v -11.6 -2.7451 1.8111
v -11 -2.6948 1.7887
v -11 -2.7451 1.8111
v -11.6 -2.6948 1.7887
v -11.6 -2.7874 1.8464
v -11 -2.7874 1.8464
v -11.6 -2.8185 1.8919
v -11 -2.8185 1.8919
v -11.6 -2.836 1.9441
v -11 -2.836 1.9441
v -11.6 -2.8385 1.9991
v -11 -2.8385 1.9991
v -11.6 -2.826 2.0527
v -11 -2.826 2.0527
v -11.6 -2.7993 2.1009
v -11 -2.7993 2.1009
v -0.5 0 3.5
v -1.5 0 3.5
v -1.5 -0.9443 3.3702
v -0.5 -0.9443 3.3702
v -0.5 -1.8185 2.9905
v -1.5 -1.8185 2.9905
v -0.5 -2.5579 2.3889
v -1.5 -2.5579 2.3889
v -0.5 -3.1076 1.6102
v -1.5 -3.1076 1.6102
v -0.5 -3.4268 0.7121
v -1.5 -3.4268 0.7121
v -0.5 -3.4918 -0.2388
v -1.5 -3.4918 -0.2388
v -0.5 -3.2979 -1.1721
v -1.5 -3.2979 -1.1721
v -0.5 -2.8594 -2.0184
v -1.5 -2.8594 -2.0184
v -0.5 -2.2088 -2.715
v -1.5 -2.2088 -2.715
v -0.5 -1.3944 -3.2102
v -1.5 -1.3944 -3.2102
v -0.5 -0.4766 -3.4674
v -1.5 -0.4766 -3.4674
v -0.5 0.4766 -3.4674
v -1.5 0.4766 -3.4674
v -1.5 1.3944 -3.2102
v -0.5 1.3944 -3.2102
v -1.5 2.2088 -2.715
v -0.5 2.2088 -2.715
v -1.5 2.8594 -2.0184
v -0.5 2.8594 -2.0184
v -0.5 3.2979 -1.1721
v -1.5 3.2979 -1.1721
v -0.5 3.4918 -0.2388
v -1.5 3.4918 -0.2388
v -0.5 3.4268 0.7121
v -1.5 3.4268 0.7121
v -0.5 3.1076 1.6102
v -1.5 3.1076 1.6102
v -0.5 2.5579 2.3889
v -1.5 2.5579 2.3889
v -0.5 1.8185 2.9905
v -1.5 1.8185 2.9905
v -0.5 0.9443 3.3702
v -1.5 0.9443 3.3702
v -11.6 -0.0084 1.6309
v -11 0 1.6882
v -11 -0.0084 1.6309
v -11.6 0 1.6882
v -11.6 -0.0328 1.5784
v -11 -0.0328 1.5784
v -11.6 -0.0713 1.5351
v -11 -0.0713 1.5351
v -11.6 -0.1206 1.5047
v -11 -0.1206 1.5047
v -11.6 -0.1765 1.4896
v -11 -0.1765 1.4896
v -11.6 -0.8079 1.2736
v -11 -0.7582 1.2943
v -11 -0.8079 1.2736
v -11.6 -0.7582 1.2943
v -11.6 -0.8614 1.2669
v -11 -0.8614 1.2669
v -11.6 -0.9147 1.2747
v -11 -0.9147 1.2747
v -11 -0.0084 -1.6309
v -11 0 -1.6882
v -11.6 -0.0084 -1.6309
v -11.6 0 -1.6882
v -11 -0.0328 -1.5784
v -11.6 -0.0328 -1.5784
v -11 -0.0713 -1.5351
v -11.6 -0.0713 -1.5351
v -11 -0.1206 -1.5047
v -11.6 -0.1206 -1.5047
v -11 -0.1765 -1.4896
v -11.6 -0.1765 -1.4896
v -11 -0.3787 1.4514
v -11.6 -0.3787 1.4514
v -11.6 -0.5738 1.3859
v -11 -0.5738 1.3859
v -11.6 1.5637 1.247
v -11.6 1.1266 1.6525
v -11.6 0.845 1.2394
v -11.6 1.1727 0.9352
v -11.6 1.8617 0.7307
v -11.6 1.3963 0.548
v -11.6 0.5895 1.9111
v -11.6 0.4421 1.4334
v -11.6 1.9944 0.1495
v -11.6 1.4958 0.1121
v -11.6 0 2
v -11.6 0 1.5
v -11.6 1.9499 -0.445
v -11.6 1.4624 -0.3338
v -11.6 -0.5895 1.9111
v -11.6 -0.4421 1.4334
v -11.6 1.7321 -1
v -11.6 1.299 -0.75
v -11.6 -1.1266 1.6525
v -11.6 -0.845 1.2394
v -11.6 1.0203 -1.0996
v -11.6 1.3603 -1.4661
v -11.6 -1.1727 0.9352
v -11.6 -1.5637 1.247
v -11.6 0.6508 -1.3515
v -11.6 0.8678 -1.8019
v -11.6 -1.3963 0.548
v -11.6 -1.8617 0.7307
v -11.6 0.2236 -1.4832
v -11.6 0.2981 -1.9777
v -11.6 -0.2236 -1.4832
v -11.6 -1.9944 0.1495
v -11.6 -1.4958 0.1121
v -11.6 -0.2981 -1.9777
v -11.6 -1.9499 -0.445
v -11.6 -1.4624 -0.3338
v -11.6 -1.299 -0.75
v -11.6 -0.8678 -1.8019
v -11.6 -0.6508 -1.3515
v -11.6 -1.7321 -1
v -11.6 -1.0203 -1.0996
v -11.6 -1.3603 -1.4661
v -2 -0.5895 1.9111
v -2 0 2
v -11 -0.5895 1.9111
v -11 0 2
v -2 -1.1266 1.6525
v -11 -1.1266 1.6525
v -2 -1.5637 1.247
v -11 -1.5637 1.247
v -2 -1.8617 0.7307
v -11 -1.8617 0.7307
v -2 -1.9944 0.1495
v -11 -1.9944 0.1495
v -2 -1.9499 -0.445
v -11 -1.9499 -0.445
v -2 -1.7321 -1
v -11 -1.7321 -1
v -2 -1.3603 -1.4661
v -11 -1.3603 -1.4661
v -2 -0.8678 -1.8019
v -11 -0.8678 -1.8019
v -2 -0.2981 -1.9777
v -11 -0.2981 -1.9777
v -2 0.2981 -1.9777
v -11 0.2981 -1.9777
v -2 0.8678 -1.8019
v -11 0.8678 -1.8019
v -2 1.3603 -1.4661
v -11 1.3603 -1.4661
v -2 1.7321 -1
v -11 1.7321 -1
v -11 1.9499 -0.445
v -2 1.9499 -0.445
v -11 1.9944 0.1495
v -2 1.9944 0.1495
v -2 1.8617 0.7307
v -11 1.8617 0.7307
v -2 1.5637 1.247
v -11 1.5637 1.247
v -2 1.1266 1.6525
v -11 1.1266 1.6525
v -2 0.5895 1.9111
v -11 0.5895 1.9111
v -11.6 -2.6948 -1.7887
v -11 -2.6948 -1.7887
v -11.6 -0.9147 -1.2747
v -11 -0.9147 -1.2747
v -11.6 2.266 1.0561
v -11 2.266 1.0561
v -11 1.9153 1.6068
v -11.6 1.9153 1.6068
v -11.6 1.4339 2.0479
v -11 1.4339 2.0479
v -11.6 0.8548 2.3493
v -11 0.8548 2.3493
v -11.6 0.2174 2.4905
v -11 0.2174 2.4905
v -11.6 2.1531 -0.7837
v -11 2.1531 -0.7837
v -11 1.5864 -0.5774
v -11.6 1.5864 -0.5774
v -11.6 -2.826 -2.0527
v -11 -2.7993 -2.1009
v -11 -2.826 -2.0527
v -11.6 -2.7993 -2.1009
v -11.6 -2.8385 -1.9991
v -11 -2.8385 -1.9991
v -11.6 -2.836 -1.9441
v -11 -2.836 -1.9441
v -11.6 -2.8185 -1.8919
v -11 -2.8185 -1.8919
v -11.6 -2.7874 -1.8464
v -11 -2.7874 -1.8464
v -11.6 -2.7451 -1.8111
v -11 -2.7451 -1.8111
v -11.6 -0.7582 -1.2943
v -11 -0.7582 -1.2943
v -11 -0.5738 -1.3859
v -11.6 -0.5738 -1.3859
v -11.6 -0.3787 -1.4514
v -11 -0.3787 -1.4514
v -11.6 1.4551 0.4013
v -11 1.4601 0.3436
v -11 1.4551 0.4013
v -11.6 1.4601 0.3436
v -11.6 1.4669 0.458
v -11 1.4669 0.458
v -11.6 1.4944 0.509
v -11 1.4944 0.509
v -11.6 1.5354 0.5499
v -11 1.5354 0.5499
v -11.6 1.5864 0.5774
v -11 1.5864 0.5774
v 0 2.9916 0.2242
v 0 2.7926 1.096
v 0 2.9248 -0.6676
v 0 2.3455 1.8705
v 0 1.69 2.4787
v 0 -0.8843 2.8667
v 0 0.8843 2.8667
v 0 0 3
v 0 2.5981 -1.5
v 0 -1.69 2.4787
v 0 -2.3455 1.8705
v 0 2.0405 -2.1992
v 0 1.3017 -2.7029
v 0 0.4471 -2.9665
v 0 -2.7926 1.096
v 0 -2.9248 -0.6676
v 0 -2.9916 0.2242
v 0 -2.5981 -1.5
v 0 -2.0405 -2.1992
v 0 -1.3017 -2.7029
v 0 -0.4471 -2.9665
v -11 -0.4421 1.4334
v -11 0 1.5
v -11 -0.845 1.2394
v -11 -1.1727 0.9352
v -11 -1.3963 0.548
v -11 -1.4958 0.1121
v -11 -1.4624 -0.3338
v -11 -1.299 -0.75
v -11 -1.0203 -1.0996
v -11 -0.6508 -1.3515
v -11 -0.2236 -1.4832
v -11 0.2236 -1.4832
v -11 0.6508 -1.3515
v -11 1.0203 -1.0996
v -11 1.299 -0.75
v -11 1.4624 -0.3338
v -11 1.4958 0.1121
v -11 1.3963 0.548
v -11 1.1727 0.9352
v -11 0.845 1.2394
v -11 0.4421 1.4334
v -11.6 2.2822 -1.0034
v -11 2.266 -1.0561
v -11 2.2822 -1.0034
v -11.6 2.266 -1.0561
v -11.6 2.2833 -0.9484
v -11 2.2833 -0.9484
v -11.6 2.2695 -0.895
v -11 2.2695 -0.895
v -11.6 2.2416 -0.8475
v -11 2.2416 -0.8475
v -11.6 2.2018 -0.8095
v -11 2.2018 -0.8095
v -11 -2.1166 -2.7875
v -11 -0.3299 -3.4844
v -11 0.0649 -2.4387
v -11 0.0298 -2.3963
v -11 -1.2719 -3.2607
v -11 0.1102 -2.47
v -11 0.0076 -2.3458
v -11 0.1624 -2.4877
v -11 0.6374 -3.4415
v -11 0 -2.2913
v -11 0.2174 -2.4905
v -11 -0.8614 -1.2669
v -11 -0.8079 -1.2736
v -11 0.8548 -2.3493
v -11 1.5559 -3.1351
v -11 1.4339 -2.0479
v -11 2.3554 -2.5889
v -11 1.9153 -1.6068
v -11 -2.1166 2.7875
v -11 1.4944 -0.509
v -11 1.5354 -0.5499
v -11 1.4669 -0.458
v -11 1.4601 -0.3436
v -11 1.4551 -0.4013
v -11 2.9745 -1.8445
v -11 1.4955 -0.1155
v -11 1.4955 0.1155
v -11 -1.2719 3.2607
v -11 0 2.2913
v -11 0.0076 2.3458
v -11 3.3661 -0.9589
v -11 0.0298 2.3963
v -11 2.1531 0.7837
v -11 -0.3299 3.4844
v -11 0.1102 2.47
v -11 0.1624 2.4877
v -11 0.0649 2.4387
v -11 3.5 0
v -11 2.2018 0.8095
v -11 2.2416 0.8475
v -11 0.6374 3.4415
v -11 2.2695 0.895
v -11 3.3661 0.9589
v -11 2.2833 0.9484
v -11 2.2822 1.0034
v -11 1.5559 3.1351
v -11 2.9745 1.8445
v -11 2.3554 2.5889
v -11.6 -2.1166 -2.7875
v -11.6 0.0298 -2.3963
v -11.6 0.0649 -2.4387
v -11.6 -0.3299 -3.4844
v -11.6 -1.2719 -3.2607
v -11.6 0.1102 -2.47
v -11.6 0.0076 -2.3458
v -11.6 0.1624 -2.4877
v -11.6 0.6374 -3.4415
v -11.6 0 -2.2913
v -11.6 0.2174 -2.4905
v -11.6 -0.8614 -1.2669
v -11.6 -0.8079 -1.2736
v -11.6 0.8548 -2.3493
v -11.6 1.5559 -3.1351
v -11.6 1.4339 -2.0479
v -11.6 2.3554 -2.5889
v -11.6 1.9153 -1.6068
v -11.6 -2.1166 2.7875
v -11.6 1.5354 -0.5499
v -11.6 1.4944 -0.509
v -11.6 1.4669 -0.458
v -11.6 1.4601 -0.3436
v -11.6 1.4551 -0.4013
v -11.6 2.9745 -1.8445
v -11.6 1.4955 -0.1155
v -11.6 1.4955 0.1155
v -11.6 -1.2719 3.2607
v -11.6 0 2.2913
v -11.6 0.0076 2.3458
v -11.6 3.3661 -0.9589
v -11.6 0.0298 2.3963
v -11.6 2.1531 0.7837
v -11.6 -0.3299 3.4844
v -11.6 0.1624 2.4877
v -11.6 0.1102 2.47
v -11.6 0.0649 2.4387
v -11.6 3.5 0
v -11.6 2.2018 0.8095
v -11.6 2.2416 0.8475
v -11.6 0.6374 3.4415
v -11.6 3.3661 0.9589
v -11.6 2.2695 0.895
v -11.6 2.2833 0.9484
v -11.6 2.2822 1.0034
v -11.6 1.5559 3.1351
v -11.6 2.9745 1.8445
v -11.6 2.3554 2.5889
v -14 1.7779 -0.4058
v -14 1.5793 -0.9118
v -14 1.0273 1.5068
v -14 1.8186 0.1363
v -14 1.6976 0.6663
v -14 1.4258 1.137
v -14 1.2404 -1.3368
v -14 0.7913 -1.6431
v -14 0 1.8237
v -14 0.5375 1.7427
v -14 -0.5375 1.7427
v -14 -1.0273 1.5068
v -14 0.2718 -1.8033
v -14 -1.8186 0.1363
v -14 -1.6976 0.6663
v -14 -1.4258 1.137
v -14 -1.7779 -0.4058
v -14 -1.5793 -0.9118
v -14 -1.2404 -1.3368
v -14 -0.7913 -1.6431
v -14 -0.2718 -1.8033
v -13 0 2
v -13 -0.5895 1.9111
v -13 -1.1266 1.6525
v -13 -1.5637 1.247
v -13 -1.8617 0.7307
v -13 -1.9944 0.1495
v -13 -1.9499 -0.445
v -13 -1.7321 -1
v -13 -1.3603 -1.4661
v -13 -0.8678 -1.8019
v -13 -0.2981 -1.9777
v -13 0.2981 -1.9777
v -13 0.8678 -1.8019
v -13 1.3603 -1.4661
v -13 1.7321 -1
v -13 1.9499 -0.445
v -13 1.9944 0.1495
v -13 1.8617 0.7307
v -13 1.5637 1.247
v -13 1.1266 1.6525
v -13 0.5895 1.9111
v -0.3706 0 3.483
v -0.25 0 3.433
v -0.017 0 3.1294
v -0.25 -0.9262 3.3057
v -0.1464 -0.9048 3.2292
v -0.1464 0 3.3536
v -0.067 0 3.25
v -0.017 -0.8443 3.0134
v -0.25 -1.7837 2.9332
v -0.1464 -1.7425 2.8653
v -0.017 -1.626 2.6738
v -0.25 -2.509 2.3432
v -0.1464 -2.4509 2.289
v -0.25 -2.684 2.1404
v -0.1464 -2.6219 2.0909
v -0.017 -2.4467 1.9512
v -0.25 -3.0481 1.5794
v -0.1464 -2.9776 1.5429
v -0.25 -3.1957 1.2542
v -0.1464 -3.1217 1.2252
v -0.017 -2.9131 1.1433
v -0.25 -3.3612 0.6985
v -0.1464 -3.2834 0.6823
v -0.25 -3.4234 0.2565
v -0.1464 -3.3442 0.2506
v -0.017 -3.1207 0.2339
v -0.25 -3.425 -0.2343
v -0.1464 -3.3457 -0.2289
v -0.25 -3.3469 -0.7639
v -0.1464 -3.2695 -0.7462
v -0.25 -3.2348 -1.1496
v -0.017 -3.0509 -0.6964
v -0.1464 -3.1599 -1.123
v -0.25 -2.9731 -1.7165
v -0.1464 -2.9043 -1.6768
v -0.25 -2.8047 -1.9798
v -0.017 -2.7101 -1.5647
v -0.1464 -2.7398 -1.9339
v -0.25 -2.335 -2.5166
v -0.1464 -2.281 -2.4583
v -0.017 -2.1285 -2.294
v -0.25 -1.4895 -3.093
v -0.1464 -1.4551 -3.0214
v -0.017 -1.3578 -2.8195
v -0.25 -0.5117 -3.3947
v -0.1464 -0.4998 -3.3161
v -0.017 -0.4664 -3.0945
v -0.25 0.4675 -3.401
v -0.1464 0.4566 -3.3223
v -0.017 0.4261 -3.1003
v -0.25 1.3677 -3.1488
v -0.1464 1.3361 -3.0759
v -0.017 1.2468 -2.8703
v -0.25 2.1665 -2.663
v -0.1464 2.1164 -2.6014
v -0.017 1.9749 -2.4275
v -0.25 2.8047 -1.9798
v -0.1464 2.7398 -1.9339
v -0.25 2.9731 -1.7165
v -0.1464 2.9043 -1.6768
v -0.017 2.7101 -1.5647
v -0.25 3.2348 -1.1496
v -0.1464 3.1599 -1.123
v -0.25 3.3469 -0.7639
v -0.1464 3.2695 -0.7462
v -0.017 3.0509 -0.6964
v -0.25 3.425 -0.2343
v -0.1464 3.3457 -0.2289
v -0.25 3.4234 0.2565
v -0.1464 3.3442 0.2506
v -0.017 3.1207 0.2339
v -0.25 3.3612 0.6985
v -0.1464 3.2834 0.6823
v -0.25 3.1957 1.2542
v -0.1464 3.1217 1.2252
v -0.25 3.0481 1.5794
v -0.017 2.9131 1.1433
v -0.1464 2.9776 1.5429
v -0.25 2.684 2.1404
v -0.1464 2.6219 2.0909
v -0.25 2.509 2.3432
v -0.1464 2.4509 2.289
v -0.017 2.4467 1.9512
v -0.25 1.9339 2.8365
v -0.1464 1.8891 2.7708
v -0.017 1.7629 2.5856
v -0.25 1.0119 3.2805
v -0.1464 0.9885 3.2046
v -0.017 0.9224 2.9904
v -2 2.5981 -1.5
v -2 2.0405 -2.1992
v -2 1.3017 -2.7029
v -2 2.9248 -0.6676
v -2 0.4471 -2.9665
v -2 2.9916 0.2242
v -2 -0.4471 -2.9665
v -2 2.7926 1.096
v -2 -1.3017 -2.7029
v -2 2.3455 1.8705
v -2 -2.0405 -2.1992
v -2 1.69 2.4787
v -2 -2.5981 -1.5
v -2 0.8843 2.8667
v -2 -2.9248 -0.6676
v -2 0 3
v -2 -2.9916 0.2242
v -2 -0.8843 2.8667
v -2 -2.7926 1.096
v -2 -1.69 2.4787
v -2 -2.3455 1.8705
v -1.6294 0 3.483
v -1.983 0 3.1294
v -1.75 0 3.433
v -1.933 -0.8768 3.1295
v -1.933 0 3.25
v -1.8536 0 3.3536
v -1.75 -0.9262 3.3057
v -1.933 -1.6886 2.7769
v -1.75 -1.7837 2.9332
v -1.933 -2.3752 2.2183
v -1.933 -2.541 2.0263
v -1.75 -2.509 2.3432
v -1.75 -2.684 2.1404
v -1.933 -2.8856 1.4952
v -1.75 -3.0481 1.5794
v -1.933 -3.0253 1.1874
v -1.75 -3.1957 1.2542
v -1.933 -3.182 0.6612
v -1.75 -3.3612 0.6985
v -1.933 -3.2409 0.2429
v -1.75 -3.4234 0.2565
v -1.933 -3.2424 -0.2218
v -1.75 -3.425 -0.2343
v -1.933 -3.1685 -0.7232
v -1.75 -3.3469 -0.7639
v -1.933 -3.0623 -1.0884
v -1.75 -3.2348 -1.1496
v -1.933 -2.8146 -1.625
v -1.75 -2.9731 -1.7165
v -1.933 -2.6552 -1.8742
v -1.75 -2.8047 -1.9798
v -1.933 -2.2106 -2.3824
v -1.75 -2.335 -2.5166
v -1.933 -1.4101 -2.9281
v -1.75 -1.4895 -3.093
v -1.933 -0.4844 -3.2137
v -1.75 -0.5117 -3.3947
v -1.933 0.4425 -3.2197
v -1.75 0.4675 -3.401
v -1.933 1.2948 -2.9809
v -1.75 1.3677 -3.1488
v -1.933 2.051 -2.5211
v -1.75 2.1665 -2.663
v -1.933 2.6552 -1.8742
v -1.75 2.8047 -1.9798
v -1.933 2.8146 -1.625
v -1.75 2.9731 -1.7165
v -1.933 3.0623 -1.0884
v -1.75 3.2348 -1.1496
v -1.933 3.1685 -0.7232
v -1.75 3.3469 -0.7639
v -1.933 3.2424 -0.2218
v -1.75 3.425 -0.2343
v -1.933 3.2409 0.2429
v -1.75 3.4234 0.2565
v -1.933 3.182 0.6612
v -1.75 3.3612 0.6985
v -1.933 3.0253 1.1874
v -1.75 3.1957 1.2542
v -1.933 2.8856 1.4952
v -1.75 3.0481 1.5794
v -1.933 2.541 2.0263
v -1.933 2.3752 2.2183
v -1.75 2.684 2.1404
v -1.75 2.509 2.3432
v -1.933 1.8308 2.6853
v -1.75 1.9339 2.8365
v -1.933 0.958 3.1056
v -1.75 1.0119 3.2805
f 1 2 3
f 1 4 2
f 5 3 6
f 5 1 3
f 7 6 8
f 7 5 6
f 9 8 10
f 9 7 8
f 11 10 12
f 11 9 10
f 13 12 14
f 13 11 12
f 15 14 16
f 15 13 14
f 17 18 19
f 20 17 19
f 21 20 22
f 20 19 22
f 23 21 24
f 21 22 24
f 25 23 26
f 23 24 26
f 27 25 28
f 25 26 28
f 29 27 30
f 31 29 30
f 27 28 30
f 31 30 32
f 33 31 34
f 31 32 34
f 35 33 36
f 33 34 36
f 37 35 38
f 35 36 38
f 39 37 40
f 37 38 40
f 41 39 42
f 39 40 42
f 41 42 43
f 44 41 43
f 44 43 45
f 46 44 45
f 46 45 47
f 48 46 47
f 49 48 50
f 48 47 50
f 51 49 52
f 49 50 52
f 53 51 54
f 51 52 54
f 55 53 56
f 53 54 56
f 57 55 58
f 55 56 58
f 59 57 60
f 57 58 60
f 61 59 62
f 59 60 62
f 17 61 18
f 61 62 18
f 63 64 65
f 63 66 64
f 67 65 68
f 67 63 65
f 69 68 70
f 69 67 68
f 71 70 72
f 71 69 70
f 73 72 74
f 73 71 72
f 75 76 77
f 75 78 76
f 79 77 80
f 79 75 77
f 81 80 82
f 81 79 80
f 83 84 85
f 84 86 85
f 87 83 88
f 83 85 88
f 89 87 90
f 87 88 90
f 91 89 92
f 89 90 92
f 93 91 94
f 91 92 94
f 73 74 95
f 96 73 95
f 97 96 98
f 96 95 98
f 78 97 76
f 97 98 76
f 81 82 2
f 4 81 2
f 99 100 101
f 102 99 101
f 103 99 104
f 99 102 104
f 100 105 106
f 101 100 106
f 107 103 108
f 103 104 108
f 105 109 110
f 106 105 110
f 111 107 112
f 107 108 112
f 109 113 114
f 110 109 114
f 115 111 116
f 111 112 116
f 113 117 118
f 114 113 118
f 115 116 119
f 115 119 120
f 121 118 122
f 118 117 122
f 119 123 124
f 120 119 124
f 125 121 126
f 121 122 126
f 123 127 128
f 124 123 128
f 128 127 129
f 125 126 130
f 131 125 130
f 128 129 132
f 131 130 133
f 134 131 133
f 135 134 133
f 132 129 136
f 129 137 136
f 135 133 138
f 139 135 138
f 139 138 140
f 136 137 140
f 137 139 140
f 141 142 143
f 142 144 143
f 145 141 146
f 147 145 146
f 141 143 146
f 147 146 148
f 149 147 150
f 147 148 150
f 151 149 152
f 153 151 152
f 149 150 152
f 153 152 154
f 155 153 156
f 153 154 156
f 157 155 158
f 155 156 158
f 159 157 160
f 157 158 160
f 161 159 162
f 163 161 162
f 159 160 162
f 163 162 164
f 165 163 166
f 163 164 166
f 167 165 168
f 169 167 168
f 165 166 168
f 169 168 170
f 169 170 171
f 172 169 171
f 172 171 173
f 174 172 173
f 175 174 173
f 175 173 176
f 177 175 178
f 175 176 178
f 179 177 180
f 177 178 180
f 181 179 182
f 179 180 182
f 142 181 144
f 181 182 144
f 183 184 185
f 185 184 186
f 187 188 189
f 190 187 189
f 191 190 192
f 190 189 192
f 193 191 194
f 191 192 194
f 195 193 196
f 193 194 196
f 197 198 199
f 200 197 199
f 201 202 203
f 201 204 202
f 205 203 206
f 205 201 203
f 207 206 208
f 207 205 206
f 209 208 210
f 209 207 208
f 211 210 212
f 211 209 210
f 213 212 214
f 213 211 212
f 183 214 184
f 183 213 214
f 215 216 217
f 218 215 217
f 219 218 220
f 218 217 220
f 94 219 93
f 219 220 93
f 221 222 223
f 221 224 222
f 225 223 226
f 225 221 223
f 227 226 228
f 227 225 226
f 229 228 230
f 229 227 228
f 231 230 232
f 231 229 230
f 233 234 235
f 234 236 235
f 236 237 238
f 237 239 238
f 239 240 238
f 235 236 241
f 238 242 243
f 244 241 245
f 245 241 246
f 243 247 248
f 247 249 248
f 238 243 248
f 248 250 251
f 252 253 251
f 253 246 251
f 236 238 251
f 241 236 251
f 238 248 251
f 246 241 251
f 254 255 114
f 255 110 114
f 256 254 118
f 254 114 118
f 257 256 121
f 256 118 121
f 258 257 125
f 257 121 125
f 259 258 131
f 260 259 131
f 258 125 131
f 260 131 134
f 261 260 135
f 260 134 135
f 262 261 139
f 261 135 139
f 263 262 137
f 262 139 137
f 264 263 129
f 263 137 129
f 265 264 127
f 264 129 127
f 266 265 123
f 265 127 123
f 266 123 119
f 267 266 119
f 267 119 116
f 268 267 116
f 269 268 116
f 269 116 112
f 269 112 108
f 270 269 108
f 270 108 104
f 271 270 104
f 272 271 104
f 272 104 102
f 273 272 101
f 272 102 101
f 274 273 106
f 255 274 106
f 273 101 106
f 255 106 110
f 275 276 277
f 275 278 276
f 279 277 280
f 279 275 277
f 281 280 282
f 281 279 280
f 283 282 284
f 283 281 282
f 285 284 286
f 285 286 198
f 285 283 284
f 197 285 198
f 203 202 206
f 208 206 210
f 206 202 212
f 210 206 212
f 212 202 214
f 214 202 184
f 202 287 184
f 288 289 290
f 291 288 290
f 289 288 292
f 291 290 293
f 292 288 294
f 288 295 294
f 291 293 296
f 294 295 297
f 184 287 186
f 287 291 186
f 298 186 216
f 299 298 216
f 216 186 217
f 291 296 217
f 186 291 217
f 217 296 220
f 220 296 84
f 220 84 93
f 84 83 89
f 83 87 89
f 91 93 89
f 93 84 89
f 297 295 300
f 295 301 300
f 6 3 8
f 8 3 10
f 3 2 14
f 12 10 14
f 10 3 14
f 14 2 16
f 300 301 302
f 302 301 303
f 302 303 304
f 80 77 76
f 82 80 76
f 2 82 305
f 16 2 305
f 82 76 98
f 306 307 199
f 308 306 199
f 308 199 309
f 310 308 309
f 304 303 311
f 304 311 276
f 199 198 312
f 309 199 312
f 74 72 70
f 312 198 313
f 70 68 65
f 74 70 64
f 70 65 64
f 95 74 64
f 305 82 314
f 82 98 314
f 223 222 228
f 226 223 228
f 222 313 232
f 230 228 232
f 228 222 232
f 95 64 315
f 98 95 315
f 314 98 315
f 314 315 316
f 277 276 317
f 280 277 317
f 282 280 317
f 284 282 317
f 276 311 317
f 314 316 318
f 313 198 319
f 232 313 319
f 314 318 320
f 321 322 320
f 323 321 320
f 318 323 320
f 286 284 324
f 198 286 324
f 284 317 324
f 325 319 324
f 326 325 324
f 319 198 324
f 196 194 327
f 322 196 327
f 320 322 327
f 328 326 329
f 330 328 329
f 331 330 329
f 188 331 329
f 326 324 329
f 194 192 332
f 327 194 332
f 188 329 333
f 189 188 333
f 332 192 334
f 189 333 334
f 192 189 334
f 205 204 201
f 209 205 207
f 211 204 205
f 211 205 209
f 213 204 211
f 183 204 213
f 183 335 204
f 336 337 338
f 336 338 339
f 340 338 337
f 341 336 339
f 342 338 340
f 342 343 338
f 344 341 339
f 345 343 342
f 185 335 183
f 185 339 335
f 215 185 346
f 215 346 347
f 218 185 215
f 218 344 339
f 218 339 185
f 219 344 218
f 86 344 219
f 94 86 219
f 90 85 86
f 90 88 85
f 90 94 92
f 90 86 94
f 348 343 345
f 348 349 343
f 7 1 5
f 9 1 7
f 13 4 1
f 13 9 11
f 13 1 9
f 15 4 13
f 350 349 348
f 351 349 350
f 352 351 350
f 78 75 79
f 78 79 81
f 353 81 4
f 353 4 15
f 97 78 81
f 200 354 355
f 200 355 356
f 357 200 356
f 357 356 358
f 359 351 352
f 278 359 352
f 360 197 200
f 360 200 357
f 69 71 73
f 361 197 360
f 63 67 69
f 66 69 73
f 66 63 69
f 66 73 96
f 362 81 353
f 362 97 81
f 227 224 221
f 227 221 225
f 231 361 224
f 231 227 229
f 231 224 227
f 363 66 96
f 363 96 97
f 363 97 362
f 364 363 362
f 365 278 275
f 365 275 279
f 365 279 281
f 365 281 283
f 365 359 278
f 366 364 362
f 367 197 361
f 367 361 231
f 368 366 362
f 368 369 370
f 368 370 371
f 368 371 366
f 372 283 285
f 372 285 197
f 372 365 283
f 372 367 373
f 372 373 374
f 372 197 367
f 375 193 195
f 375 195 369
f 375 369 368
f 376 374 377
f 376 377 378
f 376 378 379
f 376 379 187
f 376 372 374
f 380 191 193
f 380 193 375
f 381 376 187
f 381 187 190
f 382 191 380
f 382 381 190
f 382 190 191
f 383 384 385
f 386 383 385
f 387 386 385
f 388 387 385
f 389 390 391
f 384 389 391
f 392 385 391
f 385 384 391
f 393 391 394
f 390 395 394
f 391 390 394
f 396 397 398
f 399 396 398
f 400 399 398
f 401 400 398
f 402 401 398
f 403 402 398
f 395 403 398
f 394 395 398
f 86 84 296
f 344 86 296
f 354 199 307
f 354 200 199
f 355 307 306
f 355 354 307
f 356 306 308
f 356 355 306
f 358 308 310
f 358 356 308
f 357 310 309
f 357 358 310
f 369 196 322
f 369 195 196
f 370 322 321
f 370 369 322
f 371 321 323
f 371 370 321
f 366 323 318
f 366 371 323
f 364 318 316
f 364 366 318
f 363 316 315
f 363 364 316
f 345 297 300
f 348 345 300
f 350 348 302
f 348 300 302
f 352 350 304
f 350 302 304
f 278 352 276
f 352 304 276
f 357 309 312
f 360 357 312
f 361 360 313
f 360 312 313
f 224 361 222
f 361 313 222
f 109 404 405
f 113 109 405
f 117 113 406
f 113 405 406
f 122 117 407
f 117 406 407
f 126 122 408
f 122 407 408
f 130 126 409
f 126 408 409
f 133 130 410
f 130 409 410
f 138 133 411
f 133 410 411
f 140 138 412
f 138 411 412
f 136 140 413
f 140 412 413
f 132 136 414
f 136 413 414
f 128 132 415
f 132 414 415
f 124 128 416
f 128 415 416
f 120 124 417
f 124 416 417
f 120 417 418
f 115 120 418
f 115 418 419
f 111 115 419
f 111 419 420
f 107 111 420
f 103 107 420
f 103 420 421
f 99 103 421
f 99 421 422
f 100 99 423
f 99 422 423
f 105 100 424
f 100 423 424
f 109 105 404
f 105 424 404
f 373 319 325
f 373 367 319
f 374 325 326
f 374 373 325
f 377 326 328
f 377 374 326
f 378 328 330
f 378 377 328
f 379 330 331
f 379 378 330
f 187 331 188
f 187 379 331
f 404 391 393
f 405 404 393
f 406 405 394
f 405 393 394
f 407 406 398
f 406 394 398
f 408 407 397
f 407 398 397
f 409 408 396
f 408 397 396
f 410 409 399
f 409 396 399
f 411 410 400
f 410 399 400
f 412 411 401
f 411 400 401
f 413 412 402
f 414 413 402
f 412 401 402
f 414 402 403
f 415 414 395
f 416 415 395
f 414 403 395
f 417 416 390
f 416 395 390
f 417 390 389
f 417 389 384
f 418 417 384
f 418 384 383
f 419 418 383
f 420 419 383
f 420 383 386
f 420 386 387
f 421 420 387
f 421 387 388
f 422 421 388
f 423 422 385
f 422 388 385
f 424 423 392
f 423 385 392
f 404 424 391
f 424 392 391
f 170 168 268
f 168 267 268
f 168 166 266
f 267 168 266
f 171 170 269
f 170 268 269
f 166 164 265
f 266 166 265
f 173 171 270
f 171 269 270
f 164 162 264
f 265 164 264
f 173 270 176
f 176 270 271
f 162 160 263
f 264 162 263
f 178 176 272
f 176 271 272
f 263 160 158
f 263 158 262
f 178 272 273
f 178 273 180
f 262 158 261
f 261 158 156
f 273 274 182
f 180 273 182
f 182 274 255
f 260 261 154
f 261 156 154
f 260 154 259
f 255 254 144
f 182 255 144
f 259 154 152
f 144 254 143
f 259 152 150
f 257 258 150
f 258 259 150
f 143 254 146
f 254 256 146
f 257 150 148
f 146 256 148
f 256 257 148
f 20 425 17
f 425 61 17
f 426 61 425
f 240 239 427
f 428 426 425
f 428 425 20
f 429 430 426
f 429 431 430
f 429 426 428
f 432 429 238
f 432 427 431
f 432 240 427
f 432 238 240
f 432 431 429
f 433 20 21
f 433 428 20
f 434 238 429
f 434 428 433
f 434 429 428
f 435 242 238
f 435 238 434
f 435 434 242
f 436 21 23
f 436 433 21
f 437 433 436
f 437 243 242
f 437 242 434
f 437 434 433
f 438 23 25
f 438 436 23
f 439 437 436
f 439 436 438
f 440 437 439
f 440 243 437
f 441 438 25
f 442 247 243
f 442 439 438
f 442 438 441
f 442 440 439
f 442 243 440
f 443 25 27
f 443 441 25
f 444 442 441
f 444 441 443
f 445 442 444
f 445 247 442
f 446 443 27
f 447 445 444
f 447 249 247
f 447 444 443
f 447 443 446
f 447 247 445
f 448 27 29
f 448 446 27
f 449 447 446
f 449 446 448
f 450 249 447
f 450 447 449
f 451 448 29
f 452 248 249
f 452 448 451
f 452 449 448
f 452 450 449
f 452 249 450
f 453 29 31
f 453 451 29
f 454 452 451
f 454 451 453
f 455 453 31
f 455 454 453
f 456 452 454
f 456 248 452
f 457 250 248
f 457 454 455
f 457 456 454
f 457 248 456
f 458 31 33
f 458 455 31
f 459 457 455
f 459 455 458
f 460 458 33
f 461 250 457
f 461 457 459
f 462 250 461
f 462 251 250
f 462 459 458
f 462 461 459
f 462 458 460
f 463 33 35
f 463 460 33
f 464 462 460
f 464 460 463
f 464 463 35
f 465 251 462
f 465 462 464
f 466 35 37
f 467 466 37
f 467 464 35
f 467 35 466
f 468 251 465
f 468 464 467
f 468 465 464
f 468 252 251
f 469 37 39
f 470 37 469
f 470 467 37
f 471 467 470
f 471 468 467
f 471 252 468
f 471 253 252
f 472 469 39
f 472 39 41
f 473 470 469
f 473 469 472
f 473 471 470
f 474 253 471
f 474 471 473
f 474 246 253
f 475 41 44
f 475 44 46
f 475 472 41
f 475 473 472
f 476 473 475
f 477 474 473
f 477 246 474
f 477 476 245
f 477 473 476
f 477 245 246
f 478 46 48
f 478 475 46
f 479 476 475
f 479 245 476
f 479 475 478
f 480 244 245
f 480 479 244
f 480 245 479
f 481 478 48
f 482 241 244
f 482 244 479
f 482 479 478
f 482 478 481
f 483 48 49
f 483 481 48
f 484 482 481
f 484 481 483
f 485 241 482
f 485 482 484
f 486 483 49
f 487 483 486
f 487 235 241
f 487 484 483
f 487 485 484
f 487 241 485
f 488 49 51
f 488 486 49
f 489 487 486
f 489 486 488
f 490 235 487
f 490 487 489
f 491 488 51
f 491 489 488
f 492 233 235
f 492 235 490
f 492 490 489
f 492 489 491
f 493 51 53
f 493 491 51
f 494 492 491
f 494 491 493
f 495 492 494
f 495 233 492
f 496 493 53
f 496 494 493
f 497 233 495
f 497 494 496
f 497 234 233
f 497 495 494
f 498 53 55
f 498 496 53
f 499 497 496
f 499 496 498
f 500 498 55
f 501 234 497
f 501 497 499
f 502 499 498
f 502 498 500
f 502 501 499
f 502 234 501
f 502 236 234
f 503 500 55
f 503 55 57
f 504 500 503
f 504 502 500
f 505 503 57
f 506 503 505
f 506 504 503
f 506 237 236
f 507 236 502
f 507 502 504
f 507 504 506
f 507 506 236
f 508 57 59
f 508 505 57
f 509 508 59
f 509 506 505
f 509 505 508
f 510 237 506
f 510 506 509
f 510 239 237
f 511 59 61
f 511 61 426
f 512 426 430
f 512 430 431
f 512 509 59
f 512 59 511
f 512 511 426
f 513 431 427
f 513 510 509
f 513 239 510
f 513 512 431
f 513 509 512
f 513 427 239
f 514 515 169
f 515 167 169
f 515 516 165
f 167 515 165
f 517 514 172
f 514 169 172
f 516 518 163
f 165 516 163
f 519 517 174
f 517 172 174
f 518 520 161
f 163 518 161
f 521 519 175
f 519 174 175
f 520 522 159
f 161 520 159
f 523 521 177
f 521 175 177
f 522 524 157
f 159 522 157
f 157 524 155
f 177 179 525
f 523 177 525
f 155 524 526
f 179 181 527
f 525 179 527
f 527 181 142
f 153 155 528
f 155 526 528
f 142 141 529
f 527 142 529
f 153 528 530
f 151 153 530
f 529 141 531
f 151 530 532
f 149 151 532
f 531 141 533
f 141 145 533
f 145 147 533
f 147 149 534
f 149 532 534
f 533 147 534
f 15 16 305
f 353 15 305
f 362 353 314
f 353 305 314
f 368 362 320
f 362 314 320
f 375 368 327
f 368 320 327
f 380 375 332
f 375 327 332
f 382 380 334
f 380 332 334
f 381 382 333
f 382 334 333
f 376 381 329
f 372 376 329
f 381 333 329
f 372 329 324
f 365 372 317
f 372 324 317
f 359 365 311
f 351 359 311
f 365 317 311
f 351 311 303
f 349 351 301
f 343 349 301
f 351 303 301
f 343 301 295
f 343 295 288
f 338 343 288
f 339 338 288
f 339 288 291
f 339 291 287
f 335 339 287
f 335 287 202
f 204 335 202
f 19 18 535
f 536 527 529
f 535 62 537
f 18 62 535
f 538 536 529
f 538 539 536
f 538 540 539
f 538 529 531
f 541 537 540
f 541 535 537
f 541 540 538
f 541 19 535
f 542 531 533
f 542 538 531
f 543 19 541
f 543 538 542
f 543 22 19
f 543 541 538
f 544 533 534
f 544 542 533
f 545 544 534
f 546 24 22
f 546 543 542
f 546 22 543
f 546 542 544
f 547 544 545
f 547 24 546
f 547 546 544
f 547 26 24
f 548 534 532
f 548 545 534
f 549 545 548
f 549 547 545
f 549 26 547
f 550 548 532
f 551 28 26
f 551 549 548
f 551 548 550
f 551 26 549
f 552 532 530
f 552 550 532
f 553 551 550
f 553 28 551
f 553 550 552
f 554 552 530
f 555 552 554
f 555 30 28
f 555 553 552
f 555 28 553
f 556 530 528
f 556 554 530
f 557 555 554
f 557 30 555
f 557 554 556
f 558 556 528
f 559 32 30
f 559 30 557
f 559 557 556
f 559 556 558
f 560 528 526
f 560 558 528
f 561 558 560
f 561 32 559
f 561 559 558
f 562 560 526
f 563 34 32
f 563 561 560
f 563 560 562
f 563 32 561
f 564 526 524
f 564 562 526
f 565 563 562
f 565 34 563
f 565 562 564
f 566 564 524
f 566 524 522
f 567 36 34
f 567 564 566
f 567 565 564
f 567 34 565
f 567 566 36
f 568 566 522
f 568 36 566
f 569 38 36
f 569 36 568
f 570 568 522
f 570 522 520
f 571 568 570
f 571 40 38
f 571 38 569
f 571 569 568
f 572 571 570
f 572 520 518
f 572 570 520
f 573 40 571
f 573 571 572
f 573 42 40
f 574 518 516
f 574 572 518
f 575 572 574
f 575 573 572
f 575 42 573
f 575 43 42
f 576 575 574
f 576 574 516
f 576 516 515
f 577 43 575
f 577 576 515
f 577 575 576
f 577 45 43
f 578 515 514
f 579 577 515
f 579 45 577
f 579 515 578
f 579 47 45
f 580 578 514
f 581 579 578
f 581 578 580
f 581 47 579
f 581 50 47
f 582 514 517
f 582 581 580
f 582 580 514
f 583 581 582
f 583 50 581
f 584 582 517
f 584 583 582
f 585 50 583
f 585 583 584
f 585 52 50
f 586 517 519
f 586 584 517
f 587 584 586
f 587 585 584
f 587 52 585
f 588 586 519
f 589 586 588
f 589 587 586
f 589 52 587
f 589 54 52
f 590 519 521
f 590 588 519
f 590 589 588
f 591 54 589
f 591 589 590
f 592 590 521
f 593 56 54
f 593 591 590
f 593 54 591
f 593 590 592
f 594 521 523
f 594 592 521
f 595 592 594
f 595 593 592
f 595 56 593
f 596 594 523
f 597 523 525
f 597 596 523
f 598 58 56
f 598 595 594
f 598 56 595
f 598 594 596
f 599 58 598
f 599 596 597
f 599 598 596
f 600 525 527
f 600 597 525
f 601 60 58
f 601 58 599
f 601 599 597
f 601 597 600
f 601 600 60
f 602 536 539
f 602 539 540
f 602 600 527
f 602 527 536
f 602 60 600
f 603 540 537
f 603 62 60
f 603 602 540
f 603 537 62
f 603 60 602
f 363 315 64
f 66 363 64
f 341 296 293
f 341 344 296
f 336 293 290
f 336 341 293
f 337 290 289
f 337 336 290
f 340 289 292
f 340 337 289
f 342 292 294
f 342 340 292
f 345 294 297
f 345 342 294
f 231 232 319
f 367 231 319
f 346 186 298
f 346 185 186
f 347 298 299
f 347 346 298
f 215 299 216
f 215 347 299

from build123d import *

# Parameters (mm, degrees)
CHAMFER_1_SIZE  = 1
CHAMFER_1_SIZE2 = 0.176326981
FILLET_1_R      = 0.5
EXTRUDE_2_DEPTH = 0.6
FILLET_2_R      = 0.2


with BuildPart() as part:
    # 草图1 → 旋转1 (revolve)
    with BuildSketch(Plane(origin=(0, 0, 0), x_dir=(1, 0, 0), z_dir=(0, 1, 0)), mode=Mode.PRIVATE) as revolve_1_sk:
        Polygon((-14, 0), (0, 0), (0, 3.5), (-2, 3.5), (-2, 2), (-11, 2), (-11, 1.5), (-11.6, 1.5), (-11.6, 2), (-14, 2), align=None)
    revolve(revolve_1_sk.sketch.rotate(Axis((-14, 0, 0), (1, 0, 0)), 180), axis=Axis((-14, 0, 0), (1, 0, 0)))

    # 倒角1
    chamfer_1_edges = [part.edges().sort_by_distance(p)[0] for p in [
        (-14, 0, -2),
    ]]
    chamfer_1_side = [part.faces().sort_by_distance(p)[0] for p in [
        (-12.8, 0, -2),
    ]]
    chamfer(chamfer_1_edges, length=CHAMFER_1_SIZE, length2=CHAMFER_1_SIZE2, reference=chamfer_1_side[0])

    # 圆角1
    fillet_1_edges = [part.edges().sort_by_distance(p)[0] for p in [
        (-2, 0, -3.5),
        (0, 0, -3.5),
    ]]
    fillet(fillet_1_edges, radius=FILLET_1_R)


with BuildPart() as body_2:
    # 草图3 → 凸台-拉伸2 (new body)
    with BuildSketch(Plane.ZY.offset(11)):
        with BuildLine():
            Line((-1.5, 0), (-2.5, 0))
            ThreePointArc((-2.5, 0), (-2.047880111, 1.433941091), (-0.855050358, 2.349231552))
            Line((-0.855050358, 2.349231552), (-0.513030215, 1.409538931))
            ThreePointArc((-0.513030215, 1.409538931), (0, 1.5), (0.513030215, 1.409538931))
            Line((0.513030215, 1.409538931), (0.855050358, 2.349231552))
            ThreePointArc((0.855050358, 2.349231552), (2.047880111, 1.433941091), (2.5, 0))
            Line((2.5, 0), (1.5, 0))
            ThreePointArc((1.5, 0), (1.436140662, -0.433012702), (1.25, -0.829156198))
            Line((1.25, -0.829156198), (1.865639407, -2.961315519))
            ThreePointArc((1.865639407, -2.961315519), (0, 3.5), (-1.865639407, -2.961315519))
            Line((-1.865639407, -2.961315519), (-1.25, -0.829156198))
            ThreePointArc((-1.25, -0.829156198), (-1.436140662, -0.433012702), (-1.5, 0))
        make_face()
    extrude(amount=EXTRUDE_2_DEPTH)

    # 圆角2
    fillet_2_edges = [body_2.edges().sort_by_distance(p)[0] for p in [
        (-11.3, -0.829156198, -1.25),
        (-11.3, -2.961315519, -1.865639407),
        (-11.3, -2.961315519, 1.865639407),
        (-11.3, -0.829156198, 1.25),
        (-11.3, 0, 1.5),
        (-11.3, 0, 2.5),
        (-11.3, 2.349231552, 0.855050358),
        (-11.3, 1.409538931, 0.513030215),
        (-11.3, 1.409538931, -0.513030215),
        (-11.3, 2.349231552, -0.855050358),
        (-11.3, 0, -2.5),
        (-11.3, 0, -1.5),
    ]]
    fillet(fillet_2_edges, radius=FILLET_2_R)


solid = Compound([part.part, body_2.part])
